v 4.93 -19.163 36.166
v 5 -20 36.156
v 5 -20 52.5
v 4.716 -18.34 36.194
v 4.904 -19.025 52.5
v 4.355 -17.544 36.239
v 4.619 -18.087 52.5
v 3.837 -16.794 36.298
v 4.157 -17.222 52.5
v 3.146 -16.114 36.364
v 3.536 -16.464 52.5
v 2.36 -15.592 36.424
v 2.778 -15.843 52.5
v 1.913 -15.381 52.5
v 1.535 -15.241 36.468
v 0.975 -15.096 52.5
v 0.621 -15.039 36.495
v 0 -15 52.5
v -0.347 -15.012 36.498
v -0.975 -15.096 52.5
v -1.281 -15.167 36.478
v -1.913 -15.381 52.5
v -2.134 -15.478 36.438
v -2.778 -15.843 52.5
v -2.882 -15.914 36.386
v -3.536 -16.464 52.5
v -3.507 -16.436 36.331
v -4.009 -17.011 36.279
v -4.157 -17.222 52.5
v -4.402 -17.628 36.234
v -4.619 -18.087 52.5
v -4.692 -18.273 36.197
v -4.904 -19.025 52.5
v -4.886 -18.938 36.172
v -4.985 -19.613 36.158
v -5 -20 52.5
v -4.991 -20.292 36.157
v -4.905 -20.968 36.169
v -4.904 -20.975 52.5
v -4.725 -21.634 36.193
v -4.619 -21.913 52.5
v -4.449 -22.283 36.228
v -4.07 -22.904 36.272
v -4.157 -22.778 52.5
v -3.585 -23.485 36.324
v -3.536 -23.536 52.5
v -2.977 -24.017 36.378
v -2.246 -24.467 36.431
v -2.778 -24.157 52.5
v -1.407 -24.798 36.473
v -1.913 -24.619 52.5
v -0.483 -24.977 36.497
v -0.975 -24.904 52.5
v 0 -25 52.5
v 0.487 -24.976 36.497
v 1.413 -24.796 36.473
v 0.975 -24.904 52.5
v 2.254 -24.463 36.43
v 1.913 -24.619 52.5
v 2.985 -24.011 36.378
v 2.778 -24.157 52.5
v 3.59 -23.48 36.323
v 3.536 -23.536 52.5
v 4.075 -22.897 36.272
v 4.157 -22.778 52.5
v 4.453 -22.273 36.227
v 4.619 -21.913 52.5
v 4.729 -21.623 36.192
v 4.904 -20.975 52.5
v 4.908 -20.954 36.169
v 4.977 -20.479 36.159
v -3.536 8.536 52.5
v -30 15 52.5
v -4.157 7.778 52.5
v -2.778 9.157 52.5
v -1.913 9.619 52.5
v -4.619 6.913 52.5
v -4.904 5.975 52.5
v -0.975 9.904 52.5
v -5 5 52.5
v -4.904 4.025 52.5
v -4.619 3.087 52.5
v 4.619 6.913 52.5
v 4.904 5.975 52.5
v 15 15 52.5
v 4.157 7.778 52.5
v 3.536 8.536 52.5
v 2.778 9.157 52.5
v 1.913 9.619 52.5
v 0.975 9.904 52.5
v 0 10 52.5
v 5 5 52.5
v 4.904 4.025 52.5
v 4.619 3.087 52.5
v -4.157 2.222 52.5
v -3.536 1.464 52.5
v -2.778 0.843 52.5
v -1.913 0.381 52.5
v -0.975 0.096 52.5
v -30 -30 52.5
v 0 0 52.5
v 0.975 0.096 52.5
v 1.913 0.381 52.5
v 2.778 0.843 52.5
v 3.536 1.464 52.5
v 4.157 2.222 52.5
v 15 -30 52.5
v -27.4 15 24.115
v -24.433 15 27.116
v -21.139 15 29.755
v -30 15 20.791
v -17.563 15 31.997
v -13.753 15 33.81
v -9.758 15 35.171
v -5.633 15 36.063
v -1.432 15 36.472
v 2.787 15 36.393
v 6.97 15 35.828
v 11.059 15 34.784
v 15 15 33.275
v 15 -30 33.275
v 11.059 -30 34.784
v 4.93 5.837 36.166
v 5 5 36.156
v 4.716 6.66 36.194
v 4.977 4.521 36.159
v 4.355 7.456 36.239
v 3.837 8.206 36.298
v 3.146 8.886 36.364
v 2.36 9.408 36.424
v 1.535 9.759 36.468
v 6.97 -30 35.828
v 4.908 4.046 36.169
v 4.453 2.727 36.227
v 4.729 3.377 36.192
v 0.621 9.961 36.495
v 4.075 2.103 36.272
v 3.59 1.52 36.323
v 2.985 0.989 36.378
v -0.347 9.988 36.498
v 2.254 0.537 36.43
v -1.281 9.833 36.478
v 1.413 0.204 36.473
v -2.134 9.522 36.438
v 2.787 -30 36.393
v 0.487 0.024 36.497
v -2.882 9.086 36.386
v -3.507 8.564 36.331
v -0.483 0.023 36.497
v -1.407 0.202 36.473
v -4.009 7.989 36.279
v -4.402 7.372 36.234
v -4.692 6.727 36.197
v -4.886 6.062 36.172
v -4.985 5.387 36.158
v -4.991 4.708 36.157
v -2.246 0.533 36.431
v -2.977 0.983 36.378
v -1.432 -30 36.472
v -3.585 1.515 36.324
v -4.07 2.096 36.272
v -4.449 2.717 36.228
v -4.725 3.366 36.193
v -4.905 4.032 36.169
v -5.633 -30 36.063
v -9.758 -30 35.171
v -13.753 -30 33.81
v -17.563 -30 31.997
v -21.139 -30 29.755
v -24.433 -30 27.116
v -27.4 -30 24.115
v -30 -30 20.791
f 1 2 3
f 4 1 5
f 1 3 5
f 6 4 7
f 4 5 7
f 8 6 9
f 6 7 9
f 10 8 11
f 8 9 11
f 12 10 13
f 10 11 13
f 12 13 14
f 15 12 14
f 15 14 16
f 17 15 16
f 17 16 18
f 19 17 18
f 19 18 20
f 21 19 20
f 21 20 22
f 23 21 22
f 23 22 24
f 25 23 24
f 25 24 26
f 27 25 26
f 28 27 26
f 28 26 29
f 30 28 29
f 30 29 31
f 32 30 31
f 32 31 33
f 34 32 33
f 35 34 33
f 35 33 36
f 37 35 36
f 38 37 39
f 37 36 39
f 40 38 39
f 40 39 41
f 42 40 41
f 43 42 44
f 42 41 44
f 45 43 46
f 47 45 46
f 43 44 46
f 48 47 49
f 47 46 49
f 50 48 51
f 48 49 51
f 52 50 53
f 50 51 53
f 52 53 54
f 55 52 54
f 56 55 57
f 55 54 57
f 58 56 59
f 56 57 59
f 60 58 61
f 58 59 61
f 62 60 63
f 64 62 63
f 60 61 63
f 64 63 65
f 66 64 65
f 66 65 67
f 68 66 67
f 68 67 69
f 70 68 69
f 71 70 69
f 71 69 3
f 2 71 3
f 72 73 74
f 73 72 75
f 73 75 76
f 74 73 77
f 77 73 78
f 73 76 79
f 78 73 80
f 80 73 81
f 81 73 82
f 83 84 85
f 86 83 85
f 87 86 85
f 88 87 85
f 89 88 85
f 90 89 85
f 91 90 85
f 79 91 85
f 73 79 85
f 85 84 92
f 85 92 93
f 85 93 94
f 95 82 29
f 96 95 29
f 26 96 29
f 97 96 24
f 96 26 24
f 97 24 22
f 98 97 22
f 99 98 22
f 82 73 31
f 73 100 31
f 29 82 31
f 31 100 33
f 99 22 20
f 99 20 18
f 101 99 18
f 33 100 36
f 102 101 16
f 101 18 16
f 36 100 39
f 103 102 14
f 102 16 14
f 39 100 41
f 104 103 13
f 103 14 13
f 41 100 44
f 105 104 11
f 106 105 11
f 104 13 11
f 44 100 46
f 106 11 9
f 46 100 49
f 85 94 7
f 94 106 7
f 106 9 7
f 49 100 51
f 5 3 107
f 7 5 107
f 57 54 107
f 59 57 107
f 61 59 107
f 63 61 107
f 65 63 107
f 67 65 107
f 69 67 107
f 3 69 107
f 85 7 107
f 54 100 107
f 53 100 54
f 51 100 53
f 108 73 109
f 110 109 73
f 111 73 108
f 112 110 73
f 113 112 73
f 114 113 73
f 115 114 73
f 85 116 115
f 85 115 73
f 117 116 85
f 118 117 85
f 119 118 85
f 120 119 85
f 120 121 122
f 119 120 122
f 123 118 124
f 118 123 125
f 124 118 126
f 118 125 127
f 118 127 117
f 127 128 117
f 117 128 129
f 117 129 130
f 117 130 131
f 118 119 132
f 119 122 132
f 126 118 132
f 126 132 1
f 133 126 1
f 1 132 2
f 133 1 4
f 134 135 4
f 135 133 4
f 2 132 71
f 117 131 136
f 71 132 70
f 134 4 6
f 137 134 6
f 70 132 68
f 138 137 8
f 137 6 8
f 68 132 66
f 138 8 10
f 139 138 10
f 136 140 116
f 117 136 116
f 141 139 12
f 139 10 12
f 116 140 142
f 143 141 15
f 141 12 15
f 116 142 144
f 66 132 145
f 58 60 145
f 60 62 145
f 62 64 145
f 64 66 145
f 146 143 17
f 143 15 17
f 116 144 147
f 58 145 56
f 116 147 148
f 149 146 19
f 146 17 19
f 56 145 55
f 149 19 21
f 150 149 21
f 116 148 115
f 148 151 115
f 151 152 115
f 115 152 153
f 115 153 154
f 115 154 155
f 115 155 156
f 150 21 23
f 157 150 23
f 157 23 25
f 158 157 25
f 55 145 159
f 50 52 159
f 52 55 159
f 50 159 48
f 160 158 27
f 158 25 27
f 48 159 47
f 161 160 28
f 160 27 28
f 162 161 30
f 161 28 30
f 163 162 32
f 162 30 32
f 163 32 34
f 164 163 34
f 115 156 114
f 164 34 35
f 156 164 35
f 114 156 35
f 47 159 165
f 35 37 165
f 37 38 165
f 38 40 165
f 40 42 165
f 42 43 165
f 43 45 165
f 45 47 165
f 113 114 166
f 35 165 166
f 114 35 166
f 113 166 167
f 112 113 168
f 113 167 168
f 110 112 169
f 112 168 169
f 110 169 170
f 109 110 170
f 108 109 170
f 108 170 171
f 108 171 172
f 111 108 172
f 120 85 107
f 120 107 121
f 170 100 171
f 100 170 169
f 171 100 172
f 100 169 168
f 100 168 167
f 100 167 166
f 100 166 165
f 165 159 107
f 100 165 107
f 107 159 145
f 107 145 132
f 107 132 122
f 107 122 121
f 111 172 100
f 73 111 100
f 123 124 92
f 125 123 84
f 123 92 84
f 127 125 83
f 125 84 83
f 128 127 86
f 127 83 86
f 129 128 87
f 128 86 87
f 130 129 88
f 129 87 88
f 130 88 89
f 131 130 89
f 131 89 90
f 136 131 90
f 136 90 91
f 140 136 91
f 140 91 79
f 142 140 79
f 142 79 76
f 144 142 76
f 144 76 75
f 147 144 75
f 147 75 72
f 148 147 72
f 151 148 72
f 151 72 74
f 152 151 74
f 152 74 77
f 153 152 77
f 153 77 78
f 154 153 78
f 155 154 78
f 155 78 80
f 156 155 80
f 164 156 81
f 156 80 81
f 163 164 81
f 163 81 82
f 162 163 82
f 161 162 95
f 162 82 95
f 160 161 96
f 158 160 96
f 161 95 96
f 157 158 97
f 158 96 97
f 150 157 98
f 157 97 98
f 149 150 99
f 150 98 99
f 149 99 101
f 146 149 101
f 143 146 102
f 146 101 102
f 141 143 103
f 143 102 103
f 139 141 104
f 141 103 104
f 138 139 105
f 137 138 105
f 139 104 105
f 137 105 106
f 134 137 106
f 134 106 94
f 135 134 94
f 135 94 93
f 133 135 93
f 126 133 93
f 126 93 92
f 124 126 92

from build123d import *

# Parameters (mm, degrees)
BOSS_EXTRUDE1_DEPTH      = 15
BOSS_EXTRUDE1_DEPTH_BACK = 30
SKETCH2_R                = 5
CUT_EXTRUDE1_DEPTH       = 53.966825438


with BuildPart() as part:
    # Sketch1 → Boss-Extrude1 (new, two sides: drawn at the far end of the back side and taken through both)
    with BuildSketch(Plane(origin=(0, 0, 0), x_dir=(1, 0, 0), z_dir=(0, 1, 0)).offset(-BOSS_EXTRUDE1_DEPTH_BACK)):
        with BuildLine():
            ThreePointArc((15, -33.275366264), (-9.757930329, -35.171477019), (-30, -20.790622886))
            Line((-30, -20.790622886), (-30, -52.5))
            Line((-30, -52.5), (15, -52.5))
            Line((15, -52.5), (15, -33.275366264))
        make_face()
    extrude(amount=BOSS_EXTRUDE1_DEPTH + BOSS_EXTRUDE1_DEPTH_BACK)

    # Sketch2 → Cut-Extrude1 (cut, through all)
    with BuildSketch(Plane.XY.offset(52.5)):
        with Locations((0, -20)):
            Circle(SKETCH2_R)
        with Locations((0, 5)):
            Circle(SKETCH2_R)
    extrude(amount=-CUT_EXTRUDE1_DEPTH, mode=Mode.SUBTRACT)


solid = part.part
